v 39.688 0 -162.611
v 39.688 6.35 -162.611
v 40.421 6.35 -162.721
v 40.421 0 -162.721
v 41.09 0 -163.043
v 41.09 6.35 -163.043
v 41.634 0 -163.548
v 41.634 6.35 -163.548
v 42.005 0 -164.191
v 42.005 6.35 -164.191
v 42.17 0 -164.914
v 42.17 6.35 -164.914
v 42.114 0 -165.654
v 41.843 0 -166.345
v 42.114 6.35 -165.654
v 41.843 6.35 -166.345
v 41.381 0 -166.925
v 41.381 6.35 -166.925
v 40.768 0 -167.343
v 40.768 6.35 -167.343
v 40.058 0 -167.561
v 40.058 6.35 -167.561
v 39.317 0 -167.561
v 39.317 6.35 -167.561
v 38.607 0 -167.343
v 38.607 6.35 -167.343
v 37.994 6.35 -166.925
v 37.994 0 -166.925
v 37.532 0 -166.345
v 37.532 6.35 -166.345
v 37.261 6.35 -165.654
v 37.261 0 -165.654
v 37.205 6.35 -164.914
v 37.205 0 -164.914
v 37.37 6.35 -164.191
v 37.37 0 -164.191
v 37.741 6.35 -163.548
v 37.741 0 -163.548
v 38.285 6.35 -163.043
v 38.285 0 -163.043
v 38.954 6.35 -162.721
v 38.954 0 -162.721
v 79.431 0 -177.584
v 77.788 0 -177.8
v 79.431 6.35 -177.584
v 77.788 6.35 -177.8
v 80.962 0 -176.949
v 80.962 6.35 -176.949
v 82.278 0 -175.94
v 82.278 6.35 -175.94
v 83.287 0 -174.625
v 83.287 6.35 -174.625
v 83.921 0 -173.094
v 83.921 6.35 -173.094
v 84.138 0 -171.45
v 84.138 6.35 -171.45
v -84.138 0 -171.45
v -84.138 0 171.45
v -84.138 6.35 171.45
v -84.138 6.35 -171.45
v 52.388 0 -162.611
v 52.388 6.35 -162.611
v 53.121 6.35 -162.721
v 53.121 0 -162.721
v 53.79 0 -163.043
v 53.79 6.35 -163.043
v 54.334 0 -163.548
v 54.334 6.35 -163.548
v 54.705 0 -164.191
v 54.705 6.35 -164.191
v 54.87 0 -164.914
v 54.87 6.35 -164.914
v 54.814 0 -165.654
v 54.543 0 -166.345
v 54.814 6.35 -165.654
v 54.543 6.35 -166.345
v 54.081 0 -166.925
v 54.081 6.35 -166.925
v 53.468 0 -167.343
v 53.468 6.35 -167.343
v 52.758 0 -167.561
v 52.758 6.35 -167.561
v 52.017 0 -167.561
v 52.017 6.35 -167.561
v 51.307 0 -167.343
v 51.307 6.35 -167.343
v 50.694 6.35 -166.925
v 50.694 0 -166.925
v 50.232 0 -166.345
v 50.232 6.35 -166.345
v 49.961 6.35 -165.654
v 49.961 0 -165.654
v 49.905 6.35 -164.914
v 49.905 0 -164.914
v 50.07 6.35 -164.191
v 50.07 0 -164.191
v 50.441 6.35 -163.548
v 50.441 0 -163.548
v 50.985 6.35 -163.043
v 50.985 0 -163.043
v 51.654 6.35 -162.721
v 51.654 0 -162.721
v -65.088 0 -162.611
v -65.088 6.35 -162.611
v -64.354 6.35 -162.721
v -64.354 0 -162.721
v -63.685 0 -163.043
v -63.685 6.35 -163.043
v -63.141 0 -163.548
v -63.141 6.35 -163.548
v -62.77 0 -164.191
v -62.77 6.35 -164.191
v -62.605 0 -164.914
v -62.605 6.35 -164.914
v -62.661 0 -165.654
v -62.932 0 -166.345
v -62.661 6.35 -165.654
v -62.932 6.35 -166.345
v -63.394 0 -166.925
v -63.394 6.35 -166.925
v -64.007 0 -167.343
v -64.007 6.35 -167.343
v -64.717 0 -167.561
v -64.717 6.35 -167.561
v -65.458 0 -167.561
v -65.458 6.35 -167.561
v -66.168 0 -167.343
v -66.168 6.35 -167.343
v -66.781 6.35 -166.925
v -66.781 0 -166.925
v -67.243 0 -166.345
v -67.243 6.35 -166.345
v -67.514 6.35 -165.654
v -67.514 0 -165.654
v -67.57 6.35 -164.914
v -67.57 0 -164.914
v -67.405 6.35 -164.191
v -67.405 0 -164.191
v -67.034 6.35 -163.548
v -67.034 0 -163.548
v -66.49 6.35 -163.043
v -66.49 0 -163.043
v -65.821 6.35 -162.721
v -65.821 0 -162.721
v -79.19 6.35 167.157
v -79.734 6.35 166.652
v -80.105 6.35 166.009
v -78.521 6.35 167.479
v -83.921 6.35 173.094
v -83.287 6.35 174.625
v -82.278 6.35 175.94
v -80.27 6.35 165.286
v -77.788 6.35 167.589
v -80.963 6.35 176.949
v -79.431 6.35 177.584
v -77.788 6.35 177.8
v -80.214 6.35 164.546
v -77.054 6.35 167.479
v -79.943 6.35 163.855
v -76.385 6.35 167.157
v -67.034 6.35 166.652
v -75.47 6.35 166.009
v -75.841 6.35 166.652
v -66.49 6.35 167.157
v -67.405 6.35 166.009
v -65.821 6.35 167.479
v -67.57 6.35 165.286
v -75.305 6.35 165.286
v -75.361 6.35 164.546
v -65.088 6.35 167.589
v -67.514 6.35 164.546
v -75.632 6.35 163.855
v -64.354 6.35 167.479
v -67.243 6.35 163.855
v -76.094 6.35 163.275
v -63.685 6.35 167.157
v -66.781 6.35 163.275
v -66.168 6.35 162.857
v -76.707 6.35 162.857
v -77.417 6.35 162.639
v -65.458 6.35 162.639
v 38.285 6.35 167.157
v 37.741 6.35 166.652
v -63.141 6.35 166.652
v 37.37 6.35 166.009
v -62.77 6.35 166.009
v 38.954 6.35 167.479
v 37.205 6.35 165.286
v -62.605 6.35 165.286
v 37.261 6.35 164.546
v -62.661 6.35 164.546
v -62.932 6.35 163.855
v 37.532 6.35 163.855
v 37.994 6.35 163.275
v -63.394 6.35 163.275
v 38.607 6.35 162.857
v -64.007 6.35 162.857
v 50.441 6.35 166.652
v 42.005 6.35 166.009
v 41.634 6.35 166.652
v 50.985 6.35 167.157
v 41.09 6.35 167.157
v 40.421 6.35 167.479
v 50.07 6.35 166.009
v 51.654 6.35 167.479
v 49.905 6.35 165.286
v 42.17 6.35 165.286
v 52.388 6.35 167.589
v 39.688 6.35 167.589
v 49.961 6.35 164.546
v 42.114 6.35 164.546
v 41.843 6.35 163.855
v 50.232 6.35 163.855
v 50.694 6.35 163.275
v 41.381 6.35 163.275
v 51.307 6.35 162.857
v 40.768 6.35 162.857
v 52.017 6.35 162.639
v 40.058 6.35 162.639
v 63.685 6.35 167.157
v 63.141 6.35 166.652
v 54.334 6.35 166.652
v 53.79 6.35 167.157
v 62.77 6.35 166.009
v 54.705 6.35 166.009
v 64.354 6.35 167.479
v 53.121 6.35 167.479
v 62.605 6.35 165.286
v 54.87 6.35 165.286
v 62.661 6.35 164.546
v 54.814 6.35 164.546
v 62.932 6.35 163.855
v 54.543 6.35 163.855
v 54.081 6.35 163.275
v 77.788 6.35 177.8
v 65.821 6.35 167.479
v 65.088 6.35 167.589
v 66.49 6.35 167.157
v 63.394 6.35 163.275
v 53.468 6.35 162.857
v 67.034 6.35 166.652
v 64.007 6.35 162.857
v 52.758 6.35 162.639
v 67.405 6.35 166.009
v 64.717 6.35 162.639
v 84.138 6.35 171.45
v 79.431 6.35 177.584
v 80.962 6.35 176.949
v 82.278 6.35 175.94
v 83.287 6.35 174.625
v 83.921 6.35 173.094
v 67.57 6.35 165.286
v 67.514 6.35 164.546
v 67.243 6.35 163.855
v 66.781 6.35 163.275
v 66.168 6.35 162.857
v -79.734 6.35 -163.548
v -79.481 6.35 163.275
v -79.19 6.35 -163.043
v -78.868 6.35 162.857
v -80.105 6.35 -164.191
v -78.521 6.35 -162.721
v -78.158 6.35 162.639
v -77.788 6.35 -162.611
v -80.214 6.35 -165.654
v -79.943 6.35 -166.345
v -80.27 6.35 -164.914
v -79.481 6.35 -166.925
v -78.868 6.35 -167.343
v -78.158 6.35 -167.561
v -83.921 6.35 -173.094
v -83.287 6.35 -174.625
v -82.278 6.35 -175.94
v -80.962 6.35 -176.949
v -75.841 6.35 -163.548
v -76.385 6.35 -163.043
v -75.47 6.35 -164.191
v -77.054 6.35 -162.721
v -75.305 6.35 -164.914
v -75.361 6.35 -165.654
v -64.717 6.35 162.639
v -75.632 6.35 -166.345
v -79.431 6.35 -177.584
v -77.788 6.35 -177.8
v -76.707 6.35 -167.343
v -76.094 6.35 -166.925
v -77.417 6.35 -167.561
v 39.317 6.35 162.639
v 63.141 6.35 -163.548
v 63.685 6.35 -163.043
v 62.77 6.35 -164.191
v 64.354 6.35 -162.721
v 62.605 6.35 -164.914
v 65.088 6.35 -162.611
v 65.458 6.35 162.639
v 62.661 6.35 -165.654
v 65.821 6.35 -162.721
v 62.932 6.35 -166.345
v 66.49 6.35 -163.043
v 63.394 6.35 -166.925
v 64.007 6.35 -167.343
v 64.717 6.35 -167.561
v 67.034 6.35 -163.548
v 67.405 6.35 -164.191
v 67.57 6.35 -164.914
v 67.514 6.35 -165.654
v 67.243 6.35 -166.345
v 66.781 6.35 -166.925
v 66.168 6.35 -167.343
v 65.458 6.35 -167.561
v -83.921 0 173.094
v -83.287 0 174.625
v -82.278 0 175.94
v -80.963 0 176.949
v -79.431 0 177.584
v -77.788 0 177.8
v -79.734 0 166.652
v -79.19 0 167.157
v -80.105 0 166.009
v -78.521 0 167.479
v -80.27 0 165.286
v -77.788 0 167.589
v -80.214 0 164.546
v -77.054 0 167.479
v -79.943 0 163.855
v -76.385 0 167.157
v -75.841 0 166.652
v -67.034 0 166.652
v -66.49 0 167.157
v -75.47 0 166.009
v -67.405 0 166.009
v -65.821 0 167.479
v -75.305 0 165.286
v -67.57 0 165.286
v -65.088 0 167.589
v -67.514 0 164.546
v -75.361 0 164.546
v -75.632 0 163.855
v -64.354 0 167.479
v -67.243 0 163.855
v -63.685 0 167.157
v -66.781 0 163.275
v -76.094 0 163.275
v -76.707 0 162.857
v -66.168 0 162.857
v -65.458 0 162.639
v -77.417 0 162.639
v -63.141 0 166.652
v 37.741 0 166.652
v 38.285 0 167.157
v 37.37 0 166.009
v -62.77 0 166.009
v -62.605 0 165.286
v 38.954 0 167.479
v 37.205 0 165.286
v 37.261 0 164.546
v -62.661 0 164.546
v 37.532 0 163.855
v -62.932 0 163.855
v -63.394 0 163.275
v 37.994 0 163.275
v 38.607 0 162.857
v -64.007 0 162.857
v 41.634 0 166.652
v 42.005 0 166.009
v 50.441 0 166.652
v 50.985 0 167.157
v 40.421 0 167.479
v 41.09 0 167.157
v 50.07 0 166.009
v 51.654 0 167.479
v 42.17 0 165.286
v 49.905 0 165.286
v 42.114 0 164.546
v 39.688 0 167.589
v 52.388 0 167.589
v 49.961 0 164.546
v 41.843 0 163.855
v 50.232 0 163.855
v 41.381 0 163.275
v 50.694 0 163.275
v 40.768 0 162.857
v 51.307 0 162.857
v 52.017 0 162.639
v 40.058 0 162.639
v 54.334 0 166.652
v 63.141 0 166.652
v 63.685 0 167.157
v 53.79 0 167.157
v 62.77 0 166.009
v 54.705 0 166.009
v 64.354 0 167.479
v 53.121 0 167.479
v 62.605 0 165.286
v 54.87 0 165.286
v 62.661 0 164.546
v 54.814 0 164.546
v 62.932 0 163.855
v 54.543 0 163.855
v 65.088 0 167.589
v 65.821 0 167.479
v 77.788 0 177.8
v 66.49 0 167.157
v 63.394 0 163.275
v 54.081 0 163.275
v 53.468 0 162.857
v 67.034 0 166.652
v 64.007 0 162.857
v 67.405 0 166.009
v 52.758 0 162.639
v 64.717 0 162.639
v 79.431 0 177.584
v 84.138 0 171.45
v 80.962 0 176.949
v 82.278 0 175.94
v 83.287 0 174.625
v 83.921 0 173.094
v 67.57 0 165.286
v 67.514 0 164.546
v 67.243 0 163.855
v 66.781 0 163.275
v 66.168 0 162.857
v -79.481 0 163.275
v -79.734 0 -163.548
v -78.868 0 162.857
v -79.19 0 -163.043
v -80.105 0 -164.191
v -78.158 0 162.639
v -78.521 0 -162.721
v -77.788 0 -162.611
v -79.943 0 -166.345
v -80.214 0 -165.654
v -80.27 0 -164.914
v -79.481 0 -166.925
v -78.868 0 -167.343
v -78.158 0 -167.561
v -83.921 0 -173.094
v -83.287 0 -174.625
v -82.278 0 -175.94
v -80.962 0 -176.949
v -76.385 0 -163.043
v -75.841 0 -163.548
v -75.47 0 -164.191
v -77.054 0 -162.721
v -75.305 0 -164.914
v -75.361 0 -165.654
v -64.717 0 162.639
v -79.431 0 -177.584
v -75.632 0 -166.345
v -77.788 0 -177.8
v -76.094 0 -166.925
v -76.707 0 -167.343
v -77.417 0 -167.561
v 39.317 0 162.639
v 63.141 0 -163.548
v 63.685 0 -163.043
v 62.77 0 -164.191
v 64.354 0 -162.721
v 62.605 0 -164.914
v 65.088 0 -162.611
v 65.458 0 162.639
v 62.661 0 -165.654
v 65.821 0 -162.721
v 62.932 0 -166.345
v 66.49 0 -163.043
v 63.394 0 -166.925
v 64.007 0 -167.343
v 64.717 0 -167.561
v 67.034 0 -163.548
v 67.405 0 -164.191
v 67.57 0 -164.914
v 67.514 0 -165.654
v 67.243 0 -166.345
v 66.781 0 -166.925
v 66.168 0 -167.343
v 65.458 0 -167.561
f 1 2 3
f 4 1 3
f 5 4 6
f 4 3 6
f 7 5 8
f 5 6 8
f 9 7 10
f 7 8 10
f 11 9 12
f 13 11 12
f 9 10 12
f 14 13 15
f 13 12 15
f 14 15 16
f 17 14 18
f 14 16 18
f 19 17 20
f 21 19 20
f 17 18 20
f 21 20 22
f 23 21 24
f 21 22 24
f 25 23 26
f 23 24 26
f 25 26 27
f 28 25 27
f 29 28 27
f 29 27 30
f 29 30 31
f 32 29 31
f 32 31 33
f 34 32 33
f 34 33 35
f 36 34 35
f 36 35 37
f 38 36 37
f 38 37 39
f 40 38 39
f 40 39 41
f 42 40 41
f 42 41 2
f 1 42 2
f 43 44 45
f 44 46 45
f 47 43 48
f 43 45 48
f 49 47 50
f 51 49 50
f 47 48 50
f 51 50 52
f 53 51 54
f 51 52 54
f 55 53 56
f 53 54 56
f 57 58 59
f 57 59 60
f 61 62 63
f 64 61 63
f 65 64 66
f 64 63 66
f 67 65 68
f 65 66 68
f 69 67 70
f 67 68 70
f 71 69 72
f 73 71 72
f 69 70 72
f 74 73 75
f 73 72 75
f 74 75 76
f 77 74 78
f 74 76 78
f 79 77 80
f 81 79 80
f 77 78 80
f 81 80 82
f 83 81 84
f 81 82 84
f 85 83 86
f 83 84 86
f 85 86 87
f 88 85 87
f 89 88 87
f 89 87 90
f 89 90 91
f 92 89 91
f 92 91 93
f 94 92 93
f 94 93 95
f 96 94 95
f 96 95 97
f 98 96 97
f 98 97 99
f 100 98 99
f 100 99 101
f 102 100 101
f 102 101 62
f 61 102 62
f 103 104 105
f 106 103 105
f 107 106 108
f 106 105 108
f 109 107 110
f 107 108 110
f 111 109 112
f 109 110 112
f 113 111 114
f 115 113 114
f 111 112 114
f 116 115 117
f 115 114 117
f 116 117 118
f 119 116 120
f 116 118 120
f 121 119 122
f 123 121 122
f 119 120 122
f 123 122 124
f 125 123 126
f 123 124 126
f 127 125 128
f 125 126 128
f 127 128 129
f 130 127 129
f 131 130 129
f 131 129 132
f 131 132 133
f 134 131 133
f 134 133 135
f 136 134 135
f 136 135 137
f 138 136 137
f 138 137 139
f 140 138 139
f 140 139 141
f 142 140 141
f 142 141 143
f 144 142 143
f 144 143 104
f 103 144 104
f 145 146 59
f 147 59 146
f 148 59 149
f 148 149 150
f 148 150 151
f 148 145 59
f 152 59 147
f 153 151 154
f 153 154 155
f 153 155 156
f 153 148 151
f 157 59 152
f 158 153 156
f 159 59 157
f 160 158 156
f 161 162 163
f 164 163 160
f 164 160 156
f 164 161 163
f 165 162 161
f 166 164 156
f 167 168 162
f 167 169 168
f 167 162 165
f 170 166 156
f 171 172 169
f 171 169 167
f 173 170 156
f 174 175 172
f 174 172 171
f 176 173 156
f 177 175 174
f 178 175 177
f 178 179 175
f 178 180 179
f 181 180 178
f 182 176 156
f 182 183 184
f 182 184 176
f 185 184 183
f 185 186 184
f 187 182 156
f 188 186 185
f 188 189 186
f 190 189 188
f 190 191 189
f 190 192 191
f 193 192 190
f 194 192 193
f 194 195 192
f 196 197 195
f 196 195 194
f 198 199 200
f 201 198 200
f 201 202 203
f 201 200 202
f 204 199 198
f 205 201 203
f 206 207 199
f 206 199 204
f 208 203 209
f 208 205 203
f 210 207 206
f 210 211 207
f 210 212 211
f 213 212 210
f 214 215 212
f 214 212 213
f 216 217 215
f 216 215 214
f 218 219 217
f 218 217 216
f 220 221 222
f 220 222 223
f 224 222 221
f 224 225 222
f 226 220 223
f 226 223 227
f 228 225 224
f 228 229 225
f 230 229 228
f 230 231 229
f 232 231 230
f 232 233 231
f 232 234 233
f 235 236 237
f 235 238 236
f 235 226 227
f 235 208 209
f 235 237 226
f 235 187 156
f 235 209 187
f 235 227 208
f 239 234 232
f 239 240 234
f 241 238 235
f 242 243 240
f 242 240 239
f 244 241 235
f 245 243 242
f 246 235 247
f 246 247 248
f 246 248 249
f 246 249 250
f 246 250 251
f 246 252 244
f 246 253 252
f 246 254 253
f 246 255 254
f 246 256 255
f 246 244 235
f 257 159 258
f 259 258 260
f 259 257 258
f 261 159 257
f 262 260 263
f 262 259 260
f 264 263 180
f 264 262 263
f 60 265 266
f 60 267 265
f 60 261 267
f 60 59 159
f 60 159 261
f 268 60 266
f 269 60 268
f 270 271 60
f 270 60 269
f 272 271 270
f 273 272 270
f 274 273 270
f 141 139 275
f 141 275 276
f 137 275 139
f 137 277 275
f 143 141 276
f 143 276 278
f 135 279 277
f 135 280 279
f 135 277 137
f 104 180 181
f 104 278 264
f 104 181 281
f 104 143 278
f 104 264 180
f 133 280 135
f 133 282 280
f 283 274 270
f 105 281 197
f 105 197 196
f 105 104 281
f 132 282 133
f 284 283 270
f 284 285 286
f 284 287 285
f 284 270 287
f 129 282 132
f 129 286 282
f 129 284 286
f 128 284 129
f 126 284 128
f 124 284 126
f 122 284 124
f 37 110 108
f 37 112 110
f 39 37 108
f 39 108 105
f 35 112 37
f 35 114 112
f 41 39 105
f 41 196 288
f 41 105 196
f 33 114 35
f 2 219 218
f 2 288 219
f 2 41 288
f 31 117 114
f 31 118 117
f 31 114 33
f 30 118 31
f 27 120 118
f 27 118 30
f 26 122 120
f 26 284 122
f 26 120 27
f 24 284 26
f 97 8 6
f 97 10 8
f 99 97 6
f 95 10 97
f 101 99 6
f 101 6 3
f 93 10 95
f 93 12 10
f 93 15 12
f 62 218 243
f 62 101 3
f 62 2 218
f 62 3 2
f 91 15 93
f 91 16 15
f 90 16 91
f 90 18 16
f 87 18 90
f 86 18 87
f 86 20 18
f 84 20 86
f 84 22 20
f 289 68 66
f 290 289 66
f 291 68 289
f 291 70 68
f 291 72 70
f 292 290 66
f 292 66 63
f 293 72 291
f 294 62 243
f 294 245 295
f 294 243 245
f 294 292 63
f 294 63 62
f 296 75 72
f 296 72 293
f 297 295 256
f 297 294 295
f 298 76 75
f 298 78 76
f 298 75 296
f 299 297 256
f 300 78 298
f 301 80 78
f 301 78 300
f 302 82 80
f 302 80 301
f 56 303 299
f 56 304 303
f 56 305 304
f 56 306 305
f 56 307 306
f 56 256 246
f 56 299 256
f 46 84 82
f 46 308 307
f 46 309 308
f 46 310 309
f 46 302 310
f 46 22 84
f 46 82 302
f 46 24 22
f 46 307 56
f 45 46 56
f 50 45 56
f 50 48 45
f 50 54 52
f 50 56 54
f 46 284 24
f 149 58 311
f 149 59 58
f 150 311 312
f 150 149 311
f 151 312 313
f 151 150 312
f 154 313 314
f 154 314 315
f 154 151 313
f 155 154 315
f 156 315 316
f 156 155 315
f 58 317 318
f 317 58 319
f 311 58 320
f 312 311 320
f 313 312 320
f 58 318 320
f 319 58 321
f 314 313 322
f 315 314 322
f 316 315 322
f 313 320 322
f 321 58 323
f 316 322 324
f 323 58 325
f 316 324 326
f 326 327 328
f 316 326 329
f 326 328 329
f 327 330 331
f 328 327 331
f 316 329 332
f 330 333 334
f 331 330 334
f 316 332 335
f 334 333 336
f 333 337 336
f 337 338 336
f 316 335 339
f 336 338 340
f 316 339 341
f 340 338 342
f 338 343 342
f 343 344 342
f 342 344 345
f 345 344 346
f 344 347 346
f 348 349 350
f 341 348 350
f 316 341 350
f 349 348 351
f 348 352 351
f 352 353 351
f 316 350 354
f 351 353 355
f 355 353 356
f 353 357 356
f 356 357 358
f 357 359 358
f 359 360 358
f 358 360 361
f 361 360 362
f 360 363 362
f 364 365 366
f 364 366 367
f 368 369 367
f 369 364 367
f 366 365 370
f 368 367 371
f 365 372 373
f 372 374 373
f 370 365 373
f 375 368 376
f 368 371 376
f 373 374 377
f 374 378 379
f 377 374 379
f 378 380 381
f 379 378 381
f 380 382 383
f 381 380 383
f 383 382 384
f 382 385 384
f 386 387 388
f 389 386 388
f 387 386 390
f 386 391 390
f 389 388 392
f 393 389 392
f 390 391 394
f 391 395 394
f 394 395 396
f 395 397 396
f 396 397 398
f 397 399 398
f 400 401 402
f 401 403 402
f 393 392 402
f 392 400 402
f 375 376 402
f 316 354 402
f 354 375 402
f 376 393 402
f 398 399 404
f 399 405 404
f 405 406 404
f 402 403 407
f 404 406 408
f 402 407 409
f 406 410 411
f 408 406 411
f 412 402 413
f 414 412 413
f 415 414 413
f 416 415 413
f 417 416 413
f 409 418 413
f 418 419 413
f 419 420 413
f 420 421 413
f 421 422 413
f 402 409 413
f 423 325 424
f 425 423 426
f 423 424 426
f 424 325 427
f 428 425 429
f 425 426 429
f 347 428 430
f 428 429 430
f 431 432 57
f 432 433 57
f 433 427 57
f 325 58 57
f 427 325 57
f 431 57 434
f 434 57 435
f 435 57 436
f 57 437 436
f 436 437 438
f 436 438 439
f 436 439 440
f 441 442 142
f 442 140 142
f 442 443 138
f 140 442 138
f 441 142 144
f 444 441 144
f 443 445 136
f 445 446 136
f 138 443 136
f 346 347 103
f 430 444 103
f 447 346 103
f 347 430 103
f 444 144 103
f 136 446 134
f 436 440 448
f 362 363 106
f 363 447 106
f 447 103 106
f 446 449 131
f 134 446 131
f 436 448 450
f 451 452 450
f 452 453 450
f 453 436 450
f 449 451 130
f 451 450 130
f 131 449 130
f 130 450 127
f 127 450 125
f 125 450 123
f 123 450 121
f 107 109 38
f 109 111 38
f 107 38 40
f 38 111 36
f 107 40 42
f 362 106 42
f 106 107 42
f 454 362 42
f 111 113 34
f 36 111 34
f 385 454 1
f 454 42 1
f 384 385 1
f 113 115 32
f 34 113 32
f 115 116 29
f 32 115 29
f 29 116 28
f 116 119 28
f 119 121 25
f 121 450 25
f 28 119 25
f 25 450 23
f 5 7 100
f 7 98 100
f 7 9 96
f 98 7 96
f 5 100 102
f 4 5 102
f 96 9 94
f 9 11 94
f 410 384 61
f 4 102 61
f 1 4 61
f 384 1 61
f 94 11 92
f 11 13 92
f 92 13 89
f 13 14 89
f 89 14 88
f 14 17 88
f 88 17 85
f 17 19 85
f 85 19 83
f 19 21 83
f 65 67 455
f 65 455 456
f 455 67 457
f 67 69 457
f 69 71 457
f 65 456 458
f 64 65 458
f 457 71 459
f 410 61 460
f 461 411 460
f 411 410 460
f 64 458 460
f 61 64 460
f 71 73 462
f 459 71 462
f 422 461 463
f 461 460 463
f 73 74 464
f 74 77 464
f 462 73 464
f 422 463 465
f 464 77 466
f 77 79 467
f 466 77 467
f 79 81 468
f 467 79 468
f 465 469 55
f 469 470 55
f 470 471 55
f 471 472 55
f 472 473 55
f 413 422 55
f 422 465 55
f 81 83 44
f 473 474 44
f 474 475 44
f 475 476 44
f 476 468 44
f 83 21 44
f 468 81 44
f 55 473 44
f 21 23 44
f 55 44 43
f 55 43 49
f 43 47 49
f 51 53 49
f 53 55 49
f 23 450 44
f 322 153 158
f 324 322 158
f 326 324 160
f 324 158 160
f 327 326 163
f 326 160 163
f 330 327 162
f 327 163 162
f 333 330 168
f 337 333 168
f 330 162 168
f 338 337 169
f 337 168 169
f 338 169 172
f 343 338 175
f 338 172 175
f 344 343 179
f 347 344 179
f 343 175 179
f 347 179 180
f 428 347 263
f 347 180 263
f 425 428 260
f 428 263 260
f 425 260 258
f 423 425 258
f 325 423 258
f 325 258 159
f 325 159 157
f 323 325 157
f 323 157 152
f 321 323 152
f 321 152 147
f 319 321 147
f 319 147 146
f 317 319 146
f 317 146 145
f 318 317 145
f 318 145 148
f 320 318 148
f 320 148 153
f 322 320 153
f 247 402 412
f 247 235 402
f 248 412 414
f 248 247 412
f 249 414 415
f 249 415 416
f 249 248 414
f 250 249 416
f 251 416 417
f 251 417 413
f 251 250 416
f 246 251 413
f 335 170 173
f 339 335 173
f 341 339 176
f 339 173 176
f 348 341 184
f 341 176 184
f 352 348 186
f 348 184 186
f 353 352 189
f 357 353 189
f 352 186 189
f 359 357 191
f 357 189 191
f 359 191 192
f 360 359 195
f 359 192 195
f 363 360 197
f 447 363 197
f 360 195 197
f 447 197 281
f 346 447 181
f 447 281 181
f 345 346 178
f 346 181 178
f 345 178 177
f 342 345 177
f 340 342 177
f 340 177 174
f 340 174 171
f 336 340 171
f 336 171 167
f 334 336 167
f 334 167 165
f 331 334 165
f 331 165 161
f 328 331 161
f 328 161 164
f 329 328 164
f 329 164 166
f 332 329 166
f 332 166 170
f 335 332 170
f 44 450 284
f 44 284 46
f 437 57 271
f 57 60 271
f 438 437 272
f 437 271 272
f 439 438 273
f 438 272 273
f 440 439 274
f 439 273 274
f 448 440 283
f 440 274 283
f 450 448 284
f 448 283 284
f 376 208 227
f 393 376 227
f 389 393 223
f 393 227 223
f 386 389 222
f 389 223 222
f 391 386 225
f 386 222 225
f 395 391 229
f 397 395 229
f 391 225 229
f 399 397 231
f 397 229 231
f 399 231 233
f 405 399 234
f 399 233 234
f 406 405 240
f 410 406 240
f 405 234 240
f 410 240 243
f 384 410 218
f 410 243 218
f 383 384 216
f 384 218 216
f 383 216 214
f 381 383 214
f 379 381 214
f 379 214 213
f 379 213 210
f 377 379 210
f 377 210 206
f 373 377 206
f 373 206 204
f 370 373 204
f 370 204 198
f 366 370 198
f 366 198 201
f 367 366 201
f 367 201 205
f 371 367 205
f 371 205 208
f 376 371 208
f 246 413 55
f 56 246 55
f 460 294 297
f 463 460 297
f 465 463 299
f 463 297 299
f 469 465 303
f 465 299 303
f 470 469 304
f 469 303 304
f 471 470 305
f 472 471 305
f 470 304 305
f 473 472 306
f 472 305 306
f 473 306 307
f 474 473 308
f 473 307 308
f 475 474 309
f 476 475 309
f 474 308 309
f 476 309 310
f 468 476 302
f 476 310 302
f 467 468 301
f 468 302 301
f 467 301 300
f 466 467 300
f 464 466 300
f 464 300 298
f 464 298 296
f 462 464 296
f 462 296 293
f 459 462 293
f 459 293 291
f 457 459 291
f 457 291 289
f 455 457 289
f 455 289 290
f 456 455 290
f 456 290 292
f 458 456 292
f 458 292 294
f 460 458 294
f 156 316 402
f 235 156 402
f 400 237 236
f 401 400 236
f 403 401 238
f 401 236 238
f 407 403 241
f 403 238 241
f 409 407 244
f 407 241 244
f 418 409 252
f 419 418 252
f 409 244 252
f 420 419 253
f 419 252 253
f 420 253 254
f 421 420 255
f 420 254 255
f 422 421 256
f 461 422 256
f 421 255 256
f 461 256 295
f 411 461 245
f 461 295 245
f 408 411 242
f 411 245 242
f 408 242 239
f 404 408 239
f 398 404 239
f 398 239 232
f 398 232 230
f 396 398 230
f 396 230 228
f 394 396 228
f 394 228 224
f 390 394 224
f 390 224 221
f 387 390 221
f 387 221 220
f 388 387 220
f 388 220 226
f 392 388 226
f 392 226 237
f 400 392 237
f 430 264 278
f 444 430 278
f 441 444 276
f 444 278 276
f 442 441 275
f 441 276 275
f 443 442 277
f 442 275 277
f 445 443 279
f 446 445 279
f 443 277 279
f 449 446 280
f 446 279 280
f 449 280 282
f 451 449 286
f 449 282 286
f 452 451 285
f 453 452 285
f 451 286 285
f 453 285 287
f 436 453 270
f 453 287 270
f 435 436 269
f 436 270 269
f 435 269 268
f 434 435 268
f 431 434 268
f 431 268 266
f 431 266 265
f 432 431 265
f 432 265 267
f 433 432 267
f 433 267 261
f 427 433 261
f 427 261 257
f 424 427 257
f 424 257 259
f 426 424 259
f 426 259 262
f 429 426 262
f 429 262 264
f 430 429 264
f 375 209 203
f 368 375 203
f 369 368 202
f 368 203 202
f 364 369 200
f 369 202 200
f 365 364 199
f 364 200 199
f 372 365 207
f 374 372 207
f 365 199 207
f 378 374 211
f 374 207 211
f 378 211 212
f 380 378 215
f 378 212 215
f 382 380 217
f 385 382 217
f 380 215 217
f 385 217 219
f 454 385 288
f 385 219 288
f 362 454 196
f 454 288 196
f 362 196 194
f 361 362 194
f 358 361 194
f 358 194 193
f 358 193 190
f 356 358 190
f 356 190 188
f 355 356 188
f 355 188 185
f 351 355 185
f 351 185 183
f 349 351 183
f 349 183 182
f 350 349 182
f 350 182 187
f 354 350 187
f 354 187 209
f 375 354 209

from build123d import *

# Parameters (mm, degrees)
SKETCH1_W           = 168.275
SKETCH1_H           = 355.6
BOSS_EXTRUDE1_DEPTH = 6.35
SKETCH2_R           = 2.4892
CUT_EXTRUDE2_DEPTH  = 197.805186431
FILLET1_R           = 6.35


with BuildPart() as part:
    # Sketch1 → Boss-Extrude1 (new body)
    with BuildSketch(Plane(origin=(0, 0, 0), x_dir=(1, 0, 0), z_dir=(0, 1, 0))):
        Rectangle(SKETCH1_W, SKETCH1_H)
    extrude(amount=BOSS_EXTRUDE1_DEPTH)

    # Sketch2 → Cut-Extrude2 (cut, through all)
    with BuildSketch(Plane(origin=(0, 6.35, 0), x_dir=(1, 0, 0), z_dir=(0, 1, 0))):
        with Locations(Location((65.0875, -165.1, 0), (0, 0, 270))):
            Circle(SKETCH2_R)
        with Locations(Location((52.3875, -165.1, 0), (0, 0, 270))):
            Circle(SKETCH2_R)
        with Locations(Location((39.6875, -165.1, 0), (0, 0, 270))):
            Circle(SKETCH2_R)
        with Locations(Location((65.0875, 165.1, 0), (0, 0, 270))):
            Circle(SKETCH2_R)
        with Locations(Location((52.3875, 165.1, 0), (0, 0, 270))):
            Circle(SKETCH2_R)
        with Locations(Location((39.6875, 165.1, 0), (0, 0, 270))):
            Circle(SKETCH2_R)
        with Locations(Location((-77.7875, -165.1, 0), (0, 0, 270))):
            Circle(SKETCH2_R)
        with Locations(Location((-65.0875, -165.1, 0), (0, 0, 270))):
            Circle(SKETCH2_R)
        with Locations(Location((-77.7875, 165.1, 0), (0, 0, 270))):
            Circle(SKETCH2_R)
        with Locations(Location((-65.0875, 165.1, 0), (0, 0, 270))):
            Circle(SKETCH2_R)
    extrude(amount=-CUT_EXTRUDE2_DEPTH, mode=Mode.SUBTRACT)

    # Fillet1
    fillet1_edges = [part.edges().sort_by_distance(p)[0] for p in [
        (84.1375, 3.175, 177.8),
        (-84.1375, 3.175, 177.8),
        (-84.1375, 3.175, -177.8),
        (84.1375, 3.175, -177.8),
    ]]
    fillet(fillet1_edges, radius=FILLET1_R)


solid = part.part
